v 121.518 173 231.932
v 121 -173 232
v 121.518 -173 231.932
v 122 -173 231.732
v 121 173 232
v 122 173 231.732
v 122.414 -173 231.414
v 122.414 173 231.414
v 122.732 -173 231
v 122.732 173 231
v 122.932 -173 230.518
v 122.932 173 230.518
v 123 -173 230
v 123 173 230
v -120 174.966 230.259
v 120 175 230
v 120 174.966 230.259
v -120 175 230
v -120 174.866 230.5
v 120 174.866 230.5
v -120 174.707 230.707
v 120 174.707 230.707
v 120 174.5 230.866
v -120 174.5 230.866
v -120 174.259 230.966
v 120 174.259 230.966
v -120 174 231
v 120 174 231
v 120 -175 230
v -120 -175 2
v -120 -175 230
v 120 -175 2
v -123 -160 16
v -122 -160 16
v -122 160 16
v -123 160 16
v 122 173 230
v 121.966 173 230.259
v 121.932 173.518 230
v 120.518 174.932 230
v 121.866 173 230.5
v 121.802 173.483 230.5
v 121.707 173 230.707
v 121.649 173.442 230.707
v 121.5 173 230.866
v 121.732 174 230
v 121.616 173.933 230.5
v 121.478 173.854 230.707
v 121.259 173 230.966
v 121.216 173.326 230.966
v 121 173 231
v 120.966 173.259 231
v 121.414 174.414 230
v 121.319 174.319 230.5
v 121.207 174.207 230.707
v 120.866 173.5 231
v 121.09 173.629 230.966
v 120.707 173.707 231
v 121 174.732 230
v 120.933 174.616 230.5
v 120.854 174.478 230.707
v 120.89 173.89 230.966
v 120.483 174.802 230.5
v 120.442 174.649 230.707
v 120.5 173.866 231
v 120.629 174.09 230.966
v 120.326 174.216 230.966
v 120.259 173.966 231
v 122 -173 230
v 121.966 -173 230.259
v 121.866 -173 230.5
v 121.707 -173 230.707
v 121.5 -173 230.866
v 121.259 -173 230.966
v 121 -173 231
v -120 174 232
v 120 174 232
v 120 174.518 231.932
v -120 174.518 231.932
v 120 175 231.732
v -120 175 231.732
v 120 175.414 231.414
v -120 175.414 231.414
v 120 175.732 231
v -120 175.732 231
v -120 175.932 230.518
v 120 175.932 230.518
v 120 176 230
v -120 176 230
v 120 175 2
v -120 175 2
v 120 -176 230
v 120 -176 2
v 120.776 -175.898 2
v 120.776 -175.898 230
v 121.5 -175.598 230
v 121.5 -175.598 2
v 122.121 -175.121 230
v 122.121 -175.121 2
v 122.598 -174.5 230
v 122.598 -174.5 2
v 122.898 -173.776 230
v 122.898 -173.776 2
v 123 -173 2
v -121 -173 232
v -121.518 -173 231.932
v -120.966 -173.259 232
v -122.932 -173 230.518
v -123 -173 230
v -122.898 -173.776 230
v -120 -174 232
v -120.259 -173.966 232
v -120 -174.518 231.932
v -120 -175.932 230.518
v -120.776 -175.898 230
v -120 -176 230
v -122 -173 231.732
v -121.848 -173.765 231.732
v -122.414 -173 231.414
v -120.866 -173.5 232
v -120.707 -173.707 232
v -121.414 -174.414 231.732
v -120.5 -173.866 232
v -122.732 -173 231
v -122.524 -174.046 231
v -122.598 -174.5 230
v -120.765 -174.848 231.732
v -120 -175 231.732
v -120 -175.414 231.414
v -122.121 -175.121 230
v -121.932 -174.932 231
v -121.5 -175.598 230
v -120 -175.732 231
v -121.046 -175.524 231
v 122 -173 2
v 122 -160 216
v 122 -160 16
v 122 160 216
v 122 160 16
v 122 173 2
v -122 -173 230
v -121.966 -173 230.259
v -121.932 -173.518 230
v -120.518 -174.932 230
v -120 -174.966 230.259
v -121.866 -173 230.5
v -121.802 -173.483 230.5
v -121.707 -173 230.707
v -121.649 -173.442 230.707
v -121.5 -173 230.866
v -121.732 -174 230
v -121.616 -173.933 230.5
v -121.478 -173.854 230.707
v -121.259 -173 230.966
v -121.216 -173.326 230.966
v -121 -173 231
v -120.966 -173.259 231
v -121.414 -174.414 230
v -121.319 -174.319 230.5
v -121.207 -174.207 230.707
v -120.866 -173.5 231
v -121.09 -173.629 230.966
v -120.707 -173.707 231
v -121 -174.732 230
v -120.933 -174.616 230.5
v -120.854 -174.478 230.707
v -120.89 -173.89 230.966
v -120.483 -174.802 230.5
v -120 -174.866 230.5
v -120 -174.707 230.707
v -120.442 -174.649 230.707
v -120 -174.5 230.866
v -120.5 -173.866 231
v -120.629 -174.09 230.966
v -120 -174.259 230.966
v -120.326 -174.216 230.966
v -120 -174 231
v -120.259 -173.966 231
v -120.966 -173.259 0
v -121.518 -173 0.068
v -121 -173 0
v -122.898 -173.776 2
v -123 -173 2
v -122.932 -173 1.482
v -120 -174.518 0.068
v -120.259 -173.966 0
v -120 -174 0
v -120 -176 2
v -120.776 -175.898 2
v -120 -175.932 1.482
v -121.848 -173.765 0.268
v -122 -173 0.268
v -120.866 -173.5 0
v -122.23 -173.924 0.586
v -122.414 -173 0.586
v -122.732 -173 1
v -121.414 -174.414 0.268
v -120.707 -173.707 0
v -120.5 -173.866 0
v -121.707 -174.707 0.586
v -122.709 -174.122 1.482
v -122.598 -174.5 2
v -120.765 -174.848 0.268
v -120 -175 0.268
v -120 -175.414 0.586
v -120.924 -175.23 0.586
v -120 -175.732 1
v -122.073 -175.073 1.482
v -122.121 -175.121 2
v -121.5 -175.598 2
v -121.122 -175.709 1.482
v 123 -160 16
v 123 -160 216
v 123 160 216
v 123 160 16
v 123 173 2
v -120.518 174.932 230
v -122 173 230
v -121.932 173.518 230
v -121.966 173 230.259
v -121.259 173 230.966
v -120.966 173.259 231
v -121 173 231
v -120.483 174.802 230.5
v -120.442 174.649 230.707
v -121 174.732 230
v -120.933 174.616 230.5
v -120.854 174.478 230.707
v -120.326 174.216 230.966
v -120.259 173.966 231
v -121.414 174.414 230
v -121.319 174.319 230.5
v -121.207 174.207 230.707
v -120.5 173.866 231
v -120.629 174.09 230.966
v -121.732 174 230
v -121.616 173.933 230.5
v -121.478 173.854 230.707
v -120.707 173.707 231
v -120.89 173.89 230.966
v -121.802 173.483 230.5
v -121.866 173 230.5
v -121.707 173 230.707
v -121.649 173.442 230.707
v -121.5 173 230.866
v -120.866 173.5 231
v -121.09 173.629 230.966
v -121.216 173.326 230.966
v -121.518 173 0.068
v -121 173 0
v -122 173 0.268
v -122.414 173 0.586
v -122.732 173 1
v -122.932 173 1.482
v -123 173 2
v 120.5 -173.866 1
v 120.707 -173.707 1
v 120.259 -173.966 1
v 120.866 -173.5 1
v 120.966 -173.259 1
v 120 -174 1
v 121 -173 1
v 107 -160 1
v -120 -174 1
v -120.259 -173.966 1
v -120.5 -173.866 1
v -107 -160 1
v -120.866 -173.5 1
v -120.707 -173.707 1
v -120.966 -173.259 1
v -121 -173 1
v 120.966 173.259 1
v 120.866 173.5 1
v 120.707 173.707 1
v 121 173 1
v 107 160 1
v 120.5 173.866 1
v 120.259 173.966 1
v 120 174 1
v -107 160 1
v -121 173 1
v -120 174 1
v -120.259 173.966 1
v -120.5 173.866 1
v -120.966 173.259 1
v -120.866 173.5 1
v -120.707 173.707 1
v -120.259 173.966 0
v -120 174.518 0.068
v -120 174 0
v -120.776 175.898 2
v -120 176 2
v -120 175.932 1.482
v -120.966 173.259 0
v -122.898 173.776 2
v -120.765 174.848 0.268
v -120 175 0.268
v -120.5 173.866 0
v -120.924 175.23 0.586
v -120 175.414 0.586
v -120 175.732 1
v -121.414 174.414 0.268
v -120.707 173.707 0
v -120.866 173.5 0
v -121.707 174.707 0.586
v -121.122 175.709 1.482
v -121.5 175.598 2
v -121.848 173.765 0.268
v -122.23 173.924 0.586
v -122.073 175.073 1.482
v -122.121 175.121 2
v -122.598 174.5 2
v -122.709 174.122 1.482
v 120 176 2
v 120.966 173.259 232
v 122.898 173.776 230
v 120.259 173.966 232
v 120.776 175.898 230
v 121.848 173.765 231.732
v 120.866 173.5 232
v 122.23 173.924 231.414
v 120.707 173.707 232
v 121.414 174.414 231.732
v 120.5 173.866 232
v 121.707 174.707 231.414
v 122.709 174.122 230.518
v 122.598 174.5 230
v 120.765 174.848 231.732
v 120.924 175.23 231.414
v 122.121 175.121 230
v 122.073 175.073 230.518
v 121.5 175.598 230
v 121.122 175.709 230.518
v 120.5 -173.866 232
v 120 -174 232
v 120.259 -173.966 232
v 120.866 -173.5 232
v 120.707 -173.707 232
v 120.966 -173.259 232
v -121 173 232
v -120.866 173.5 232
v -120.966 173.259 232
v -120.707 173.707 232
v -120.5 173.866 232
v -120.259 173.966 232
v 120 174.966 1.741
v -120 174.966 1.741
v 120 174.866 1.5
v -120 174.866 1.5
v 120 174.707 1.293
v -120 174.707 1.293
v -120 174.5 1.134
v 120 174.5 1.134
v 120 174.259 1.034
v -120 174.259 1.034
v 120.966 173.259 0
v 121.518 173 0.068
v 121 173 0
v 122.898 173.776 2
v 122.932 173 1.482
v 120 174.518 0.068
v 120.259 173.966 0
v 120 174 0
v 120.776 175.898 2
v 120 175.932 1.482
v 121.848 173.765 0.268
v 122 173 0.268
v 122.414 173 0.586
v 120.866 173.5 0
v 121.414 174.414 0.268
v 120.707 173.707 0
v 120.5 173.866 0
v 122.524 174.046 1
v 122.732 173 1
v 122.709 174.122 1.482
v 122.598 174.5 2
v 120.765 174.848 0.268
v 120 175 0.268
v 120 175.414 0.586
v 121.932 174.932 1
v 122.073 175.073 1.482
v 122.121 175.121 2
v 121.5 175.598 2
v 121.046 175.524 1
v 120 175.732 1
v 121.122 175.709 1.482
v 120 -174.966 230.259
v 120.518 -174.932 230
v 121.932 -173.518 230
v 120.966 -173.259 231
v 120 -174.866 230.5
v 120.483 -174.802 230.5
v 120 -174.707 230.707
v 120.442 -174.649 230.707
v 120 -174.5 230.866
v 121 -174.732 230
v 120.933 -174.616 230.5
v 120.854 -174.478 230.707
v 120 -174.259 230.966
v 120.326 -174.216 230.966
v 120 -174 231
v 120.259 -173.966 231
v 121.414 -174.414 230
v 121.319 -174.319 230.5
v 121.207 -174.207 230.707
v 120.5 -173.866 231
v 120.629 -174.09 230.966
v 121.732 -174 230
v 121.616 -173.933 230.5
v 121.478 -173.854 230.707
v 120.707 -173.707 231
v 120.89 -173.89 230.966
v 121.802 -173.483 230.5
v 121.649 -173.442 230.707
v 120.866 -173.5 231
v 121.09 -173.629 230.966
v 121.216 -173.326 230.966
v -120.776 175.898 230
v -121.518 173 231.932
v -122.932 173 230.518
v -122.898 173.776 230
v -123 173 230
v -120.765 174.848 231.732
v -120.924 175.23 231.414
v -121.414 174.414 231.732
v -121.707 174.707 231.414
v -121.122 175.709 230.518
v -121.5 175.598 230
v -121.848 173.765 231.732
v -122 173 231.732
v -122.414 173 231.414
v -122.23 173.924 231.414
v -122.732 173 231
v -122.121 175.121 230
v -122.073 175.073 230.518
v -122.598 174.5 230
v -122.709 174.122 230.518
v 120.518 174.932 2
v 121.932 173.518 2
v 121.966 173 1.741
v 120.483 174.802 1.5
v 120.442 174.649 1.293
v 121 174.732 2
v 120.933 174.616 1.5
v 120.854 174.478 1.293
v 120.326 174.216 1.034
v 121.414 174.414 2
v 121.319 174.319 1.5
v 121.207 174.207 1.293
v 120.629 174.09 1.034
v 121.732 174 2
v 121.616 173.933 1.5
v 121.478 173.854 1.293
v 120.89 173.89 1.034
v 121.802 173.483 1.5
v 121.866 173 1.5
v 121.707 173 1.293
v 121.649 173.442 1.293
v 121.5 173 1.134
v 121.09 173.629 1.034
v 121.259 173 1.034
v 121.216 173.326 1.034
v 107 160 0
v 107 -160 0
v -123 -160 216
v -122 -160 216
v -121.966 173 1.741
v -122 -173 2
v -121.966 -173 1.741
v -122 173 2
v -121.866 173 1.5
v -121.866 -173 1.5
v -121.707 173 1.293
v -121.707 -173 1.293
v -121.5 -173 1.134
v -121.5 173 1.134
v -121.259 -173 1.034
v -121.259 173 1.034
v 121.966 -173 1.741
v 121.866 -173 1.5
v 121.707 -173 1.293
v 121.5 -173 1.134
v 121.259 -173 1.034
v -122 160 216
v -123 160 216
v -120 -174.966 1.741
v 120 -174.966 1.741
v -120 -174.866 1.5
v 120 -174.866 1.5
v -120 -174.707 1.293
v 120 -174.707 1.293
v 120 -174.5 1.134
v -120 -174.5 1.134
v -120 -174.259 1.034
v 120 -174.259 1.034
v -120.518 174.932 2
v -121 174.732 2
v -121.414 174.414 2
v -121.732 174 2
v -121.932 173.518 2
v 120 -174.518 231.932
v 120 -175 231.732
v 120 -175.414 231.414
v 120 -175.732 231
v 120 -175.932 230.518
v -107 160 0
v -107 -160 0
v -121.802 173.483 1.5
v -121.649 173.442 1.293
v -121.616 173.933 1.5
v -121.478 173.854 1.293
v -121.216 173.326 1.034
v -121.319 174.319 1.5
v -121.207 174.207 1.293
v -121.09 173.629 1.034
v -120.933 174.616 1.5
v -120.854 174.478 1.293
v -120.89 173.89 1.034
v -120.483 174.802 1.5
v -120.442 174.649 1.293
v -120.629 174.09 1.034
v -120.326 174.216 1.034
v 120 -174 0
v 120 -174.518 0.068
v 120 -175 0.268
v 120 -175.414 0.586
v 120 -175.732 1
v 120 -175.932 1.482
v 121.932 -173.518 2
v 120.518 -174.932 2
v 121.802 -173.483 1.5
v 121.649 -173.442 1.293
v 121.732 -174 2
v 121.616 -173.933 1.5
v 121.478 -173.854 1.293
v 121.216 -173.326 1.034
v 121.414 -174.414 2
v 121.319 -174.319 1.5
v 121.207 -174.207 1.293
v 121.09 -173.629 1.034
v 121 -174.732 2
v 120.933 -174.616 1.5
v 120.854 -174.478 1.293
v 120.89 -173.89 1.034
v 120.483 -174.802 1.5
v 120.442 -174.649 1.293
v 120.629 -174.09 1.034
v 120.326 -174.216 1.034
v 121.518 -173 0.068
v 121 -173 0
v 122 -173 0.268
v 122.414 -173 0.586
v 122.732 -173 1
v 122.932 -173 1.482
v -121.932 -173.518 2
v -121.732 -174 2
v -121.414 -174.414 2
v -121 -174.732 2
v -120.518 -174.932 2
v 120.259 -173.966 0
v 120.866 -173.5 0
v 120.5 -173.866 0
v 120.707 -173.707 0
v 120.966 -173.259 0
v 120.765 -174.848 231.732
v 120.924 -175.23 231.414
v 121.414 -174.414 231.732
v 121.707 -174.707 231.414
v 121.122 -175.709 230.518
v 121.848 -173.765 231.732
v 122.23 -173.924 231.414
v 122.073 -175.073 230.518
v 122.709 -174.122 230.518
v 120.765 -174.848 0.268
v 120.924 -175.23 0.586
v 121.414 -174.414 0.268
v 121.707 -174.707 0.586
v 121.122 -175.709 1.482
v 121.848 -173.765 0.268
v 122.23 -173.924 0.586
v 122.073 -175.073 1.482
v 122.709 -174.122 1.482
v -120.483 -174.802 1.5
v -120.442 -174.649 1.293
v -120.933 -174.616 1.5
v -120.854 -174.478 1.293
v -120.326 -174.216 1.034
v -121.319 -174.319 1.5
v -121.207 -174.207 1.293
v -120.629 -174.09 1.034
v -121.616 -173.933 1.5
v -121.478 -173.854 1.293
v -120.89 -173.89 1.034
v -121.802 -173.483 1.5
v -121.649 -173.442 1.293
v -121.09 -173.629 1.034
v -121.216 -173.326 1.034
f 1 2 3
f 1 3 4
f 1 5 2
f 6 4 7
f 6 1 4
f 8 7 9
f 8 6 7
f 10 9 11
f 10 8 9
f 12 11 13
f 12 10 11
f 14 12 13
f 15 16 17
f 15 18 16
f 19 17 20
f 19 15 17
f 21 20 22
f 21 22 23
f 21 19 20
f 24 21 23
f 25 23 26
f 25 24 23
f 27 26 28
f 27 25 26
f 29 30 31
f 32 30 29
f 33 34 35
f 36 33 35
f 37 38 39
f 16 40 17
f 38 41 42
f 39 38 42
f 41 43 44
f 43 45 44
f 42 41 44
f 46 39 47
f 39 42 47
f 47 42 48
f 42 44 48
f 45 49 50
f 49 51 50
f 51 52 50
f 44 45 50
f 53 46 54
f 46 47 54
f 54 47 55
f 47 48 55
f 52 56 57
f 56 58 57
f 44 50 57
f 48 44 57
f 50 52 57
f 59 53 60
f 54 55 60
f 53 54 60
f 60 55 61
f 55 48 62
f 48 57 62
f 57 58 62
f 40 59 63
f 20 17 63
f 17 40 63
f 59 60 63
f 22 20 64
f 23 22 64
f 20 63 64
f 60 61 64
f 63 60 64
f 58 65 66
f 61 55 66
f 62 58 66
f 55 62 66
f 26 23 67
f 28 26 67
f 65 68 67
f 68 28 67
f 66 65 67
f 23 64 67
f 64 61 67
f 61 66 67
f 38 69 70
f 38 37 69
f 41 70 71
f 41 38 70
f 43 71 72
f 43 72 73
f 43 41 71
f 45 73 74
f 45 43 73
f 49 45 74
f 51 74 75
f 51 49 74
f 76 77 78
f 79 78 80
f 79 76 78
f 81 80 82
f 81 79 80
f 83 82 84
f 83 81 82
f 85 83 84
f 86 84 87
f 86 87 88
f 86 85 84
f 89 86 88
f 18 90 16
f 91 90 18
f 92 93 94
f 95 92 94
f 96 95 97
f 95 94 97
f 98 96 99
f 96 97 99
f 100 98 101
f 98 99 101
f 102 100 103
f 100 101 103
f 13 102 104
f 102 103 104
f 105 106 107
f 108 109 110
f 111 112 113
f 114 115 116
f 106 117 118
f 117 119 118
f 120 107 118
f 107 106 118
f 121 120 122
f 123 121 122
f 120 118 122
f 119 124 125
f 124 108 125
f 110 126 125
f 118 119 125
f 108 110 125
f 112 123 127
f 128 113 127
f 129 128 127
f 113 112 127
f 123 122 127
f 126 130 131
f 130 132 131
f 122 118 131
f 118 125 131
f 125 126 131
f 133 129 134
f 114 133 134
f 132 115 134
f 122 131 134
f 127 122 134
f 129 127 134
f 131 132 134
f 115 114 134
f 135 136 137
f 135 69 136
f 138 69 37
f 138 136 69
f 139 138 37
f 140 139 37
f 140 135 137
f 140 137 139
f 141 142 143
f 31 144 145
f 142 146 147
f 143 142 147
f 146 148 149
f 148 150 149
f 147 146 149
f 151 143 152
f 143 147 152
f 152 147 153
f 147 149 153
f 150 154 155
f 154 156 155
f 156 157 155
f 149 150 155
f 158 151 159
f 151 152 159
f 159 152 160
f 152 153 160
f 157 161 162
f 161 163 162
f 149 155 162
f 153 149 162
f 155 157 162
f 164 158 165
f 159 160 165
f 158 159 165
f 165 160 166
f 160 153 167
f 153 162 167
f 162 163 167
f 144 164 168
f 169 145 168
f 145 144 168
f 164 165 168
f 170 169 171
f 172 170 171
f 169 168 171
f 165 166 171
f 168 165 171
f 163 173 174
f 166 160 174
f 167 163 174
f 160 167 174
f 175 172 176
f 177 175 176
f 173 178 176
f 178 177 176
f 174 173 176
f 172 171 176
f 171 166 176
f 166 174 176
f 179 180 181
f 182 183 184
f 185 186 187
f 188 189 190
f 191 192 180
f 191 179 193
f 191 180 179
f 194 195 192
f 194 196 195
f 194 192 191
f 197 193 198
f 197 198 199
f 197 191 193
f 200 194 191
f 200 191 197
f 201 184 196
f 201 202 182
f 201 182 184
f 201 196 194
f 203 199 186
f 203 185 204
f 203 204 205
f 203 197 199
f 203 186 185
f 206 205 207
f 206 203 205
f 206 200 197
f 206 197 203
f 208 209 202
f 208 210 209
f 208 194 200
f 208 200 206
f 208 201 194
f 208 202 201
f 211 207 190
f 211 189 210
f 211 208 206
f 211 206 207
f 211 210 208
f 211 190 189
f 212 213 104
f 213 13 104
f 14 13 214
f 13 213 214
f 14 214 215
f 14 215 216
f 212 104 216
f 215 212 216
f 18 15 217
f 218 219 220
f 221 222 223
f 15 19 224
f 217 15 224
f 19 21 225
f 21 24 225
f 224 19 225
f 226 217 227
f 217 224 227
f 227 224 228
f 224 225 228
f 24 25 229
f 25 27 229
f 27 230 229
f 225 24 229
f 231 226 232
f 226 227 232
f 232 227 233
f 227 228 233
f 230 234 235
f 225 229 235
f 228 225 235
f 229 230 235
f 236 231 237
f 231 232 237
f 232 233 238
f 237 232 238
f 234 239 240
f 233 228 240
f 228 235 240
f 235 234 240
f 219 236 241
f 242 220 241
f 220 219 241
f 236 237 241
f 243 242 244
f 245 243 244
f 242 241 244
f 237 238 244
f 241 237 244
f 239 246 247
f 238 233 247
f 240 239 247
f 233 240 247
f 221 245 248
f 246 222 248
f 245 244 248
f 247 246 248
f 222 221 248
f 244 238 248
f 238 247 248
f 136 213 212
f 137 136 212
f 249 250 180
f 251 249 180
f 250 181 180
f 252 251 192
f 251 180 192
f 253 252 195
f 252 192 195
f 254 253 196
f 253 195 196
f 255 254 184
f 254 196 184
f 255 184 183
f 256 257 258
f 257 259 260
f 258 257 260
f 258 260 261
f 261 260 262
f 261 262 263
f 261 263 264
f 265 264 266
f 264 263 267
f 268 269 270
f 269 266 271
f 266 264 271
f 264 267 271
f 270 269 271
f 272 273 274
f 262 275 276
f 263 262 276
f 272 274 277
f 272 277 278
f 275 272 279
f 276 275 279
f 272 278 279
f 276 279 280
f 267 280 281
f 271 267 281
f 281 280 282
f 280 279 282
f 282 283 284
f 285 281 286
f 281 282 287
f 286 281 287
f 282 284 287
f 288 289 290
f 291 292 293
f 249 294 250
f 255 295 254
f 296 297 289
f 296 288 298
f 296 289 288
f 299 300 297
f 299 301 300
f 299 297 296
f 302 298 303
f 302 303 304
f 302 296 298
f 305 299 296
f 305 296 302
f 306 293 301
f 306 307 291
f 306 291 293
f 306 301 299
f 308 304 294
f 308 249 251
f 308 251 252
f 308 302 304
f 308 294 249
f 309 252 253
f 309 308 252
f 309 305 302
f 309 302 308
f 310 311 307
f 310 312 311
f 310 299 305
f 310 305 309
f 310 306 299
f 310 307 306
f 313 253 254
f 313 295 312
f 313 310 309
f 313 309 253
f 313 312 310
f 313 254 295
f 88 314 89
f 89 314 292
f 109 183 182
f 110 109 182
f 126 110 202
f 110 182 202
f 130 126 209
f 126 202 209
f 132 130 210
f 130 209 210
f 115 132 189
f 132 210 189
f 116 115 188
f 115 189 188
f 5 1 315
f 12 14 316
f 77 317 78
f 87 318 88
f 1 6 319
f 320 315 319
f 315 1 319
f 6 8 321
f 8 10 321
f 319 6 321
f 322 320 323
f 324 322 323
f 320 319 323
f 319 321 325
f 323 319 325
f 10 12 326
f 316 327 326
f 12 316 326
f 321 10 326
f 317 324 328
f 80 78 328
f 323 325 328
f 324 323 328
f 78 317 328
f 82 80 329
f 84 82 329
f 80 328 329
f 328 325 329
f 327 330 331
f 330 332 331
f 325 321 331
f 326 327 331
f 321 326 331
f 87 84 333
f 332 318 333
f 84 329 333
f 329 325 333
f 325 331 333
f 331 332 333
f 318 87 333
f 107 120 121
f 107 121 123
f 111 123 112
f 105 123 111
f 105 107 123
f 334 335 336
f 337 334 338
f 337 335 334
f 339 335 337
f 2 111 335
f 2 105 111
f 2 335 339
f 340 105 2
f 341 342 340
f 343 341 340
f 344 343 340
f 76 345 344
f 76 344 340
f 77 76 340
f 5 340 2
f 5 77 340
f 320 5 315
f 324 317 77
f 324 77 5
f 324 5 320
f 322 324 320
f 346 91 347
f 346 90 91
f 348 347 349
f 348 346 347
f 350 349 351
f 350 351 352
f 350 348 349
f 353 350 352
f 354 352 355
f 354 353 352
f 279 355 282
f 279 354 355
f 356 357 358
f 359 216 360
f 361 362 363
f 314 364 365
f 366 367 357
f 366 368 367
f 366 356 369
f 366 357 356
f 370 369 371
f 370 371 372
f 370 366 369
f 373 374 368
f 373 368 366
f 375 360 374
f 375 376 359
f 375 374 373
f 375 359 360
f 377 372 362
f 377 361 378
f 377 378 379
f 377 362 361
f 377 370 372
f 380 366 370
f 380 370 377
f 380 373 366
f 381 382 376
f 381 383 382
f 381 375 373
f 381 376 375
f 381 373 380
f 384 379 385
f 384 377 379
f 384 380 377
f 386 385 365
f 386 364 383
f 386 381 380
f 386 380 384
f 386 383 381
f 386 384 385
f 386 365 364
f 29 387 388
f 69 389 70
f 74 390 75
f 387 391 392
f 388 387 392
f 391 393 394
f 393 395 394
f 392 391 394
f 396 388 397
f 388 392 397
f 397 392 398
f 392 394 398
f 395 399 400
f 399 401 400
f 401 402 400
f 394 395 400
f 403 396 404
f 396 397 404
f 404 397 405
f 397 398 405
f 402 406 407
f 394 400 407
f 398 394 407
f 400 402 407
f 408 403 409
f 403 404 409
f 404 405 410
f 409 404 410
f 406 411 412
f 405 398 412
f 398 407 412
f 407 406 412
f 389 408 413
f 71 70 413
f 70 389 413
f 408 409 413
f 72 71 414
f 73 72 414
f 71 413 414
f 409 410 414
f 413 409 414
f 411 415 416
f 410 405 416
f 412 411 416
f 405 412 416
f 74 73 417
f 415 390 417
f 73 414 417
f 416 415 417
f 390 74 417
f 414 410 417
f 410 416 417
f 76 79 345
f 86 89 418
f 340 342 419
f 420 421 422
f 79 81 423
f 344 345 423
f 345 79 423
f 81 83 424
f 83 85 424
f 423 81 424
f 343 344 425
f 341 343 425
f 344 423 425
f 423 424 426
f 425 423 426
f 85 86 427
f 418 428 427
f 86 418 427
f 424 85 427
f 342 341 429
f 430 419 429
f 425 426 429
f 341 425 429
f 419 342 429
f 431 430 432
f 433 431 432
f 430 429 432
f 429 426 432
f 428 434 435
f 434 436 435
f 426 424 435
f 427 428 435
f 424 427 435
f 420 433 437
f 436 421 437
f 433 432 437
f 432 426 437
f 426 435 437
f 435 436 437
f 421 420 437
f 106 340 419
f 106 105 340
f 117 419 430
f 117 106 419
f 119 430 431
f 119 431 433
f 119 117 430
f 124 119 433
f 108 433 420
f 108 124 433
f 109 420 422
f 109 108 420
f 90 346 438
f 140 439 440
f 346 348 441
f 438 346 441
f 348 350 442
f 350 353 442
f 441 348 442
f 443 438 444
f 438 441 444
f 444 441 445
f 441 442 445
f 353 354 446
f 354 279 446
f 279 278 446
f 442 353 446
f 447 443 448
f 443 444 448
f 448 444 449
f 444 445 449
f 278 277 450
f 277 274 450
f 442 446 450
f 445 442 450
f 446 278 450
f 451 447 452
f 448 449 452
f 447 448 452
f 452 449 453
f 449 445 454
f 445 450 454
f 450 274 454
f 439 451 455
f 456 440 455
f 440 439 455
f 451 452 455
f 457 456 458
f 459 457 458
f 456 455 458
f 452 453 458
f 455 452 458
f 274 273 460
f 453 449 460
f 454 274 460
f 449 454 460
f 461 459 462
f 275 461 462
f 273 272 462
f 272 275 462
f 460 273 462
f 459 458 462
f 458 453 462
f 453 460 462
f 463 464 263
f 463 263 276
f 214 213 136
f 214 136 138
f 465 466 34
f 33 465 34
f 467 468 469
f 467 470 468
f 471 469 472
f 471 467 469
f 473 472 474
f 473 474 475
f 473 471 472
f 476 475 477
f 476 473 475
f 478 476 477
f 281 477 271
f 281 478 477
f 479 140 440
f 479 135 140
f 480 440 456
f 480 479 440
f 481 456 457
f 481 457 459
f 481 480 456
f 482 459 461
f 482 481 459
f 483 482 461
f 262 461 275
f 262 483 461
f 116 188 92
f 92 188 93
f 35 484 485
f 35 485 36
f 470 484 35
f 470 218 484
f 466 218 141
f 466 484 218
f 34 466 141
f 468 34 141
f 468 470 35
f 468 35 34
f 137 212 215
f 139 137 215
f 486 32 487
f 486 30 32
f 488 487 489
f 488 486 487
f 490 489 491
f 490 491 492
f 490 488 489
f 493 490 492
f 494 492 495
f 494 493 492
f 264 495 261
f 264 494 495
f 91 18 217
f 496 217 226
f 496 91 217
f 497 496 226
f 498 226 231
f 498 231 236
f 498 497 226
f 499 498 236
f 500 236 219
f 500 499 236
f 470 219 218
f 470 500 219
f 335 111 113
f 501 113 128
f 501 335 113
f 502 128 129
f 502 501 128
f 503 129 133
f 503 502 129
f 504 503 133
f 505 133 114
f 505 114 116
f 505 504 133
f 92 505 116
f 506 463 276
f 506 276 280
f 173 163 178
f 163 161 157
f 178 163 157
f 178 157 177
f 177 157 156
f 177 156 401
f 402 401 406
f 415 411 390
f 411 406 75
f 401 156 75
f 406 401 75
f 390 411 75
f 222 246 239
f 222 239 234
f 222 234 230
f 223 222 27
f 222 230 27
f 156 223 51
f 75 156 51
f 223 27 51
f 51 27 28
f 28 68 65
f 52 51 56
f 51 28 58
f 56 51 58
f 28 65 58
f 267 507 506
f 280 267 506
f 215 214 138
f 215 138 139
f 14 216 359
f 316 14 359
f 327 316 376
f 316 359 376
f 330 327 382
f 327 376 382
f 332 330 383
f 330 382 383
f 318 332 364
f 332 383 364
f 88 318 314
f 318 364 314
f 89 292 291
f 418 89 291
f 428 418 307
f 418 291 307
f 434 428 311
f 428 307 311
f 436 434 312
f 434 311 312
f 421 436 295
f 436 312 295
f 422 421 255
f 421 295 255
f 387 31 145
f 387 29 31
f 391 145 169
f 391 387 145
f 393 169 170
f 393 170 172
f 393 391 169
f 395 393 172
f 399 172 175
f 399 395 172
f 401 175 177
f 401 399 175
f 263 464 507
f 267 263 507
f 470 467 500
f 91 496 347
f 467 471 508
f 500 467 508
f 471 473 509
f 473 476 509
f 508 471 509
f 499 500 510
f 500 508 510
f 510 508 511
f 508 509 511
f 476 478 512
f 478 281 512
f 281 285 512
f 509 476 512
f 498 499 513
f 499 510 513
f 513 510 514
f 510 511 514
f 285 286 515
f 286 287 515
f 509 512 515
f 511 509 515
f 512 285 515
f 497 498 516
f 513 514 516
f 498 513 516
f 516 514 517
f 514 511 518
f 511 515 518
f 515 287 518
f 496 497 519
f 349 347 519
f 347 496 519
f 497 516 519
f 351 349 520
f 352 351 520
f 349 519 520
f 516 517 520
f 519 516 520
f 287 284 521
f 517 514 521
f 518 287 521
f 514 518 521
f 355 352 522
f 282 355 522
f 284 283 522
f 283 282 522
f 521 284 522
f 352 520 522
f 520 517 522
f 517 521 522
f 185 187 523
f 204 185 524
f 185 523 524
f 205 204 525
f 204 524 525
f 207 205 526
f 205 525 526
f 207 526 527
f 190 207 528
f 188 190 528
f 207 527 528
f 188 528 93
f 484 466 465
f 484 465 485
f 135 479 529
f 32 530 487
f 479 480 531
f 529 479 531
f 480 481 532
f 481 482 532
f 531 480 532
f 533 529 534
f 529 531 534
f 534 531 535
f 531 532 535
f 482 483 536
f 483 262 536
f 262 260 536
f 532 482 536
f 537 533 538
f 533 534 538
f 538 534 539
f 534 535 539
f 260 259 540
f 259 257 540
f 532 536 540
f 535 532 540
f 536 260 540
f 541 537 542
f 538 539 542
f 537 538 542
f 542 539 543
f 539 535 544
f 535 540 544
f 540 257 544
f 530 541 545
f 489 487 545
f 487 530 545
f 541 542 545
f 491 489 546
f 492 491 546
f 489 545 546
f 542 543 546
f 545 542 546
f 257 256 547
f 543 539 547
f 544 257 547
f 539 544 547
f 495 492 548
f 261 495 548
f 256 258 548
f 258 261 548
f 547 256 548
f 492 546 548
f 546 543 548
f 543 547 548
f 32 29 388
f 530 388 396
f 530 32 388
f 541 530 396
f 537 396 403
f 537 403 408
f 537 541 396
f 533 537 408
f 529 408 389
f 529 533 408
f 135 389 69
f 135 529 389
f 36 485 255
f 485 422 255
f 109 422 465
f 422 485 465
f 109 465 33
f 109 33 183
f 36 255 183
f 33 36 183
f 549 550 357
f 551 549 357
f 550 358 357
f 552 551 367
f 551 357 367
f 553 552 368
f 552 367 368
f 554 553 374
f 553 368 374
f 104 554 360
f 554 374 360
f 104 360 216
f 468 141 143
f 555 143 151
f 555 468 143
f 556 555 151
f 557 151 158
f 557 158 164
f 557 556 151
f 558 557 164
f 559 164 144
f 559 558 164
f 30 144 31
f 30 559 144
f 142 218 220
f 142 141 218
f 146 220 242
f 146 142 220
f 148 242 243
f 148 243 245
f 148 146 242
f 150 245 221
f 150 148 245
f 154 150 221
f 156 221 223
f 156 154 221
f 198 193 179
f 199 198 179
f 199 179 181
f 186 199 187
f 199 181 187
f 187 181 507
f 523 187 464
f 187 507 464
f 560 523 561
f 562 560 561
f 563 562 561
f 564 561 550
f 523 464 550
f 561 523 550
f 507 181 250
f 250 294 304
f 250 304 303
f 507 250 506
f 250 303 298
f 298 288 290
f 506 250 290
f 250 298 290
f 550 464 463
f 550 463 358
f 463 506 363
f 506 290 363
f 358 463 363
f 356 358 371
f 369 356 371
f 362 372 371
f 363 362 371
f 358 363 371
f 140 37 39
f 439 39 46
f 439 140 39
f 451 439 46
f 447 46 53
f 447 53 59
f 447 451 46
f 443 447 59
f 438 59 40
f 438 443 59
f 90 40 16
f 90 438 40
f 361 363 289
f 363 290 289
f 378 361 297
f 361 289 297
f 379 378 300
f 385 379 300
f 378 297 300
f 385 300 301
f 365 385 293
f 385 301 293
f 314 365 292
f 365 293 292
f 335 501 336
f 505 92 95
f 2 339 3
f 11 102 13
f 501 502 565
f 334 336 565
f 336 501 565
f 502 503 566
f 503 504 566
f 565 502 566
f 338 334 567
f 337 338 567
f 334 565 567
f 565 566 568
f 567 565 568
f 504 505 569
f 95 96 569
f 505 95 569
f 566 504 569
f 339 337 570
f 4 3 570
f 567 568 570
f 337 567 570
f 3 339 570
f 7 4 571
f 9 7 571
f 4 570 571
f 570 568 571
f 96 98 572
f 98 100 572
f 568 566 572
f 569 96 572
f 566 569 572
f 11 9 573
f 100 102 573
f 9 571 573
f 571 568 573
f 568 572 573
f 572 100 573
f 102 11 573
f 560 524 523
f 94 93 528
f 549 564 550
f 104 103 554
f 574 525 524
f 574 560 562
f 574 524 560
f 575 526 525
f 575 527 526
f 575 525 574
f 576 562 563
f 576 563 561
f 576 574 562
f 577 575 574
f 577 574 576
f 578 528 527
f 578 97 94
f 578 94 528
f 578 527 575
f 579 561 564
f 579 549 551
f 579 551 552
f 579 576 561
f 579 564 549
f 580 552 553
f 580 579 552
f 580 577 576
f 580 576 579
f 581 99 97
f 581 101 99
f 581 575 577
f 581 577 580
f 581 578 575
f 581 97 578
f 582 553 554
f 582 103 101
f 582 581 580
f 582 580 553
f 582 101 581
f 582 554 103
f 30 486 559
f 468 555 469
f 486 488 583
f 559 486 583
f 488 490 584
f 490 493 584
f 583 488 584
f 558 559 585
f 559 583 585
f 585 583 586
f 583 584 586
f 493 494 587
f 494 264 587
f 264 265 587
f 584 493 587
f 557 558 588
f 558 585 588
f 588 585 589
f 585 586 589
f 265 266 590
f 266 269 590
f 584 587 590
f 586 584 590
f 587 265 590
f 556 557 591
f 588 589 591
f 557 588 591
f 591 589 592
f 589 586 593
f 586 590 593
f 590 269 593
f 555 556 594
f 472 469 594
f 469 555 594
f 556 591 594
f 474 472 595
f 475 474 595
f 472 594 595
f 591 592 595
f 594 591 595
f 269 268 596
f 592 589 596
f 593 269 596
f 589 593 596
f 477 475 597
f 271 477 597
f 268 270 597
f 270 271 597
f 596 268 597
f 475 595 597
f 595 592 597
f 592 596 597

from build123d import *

# Parameters (mm, degrees)
EXTRUDE_1_DEPTH     = 232
SKETCH_2_W          = 200
SKETCH_2_H          = 320
CUT_EXTRUDE_1_DEPTH = 500
EXTRUDE_START       = -1
EXTRUDE_1_2_DEPTH   = 1
SKETCH_4_W          = 214
SKETCH_4_H          = 320
EXTRUDE_2_DEPTH     = 1
FILLET_1_R          = 1
FILLET_2_R          = 2


with BuildPart() as part:
    # Эскиз1 → Extrude 1 (new body)
    with BuildSketch(Plane.XY):
        with BuildLine():
            Line((123, -173), (123, 173))
            ThreePointArc((123, 173), (122.121320344, 175.121320344), (120, 176))
            Line((120, 176), (-120, 176))
            ThreePointArc((-120, 176), (-122.121320344, 175.121320344), (-123, 173))
            Line((-123, 173), (-123, -173))
            ThreePointArc((-123, -173), (-122.121320344, -175.121320344), (-120, -176))
            Line((-120, -176), (120, -176))
            ThreePointArc((120, -176), (122.121320344, -175.121320344), (123, -173))
        make_face()
        with BuildLine():
            Line((122, -173), (122, 173))
            ThreePointArc((122, 173), (121.414213562, 174.414213562), (120, 175))
            Line((120, 175), (-120, 175))
            ThreePointArc((-120, 175), (-121.414213562, 174.414213562), (-122, 173))
            Line((-122, 173), (-122, -173))
            ThreePointArc((-122, -173), (-121.414213562, -174.414213562), (-120, -175))
            Line((-120, -175), (120, -175))
            ThreePointArc((120, -175), (121.414213562, -174.414213562), (122, -173))
        make_face(mode=Mode.SUBTRACT)
    extrude(amount=EXTRUDE_1_DEPTH)

    # Эскиз2 → Вырез-Вытянуть1 (cut)
    with BuildSketch(Plane(origin=(123, 0, 0), x_dir=(0, 0, -1), z_dir=(1, 0, 0))):
        with Locations((-116, 0)):
            Rectangle(SKETCH_2_W, SKETCH_2_H)
    extrude(amount=-CUT_EXTRUDE_1_DEPTH, mode=Mode.SUBTRACT)

    # Эскиз3 → Extrude 1 2 (add)
    with BuildSketch(Plane.XY.offset(232).offset(EXTRUDE_START)):
        with BuildLine():
            Line((-123, 173), (-123, -173))
            ThreePointArc((-123, -173), (-122.121320344, -175.121320344), (-120, -176))
            Line((-120, -176), (120, -176))
            ThreePointArc((120, -176), (122.121320344, -175.121320344), (123, -173))
            Line((123, -173), (123, 173))
            ThreePointArc((123, 173), (122.121320344, 175.121320344), (120, 176))
            Line((120, 176), (-120, 176))
            ThreePointArc((-120, 176), (-122.121320344, 175.121320344), (-123, 173))
        make_face()
    extrude(amount=EXTRUDE_1_2_DEPTH)

    # Эскиз4 → Вытянуть2 (add)
    with BuildSketch(Plane(origin=(0, 0, 0), x_dir=(-1, 0, 0), z_dir=(0, 0, -1))):
        with BuildLine():
            Line((120, 176), (-120, 176))
            ThreePointArc((-120, 176), (-122.121320344, 175.121320344), (-123, 173))
            Line((-123, 173), (-123, -173))
            ThreePointArc((-123, -173), (-122.121320344, -175.121320344), (-120, -176))
            Line((-120, -176), (120, -176))
            ThreePointArc((120, -176), (122.121320344, -175.121320344), (123, -173))
            Line((123, -173), (123, 173))
            ThreePointArc((123, 173), (122.121320344, 175.121320344), (120, 176))
        make_face()
        Rectangle(SKETCH_4_W, SKETCH_4_H, mode=Mode.SUBTRACT)
    extrude(amount=-EXTRUDE_2_DEPTH)

    # Скругление1
    fillet_1_edges = [part.edges().sort_by_distance(p)[0] for p in [
        (-122, 0, 1),
        (-121.414213562, 174.414213562, 1),
        (0, 175, 1),
        (121.414213562, 174.414213562, 1),
        (122, 0, 1),
        (121.414213562, -174.414213562, 1),
        (0, -175, 1),
        (-121.414213562, -174.414213562, 1),
        (0, 175, 231),
        (-121.414213562, 174.414213562, 231),
        (-122, 0, 231),
        (-121.414213562, -174.414213562, 231),
        (0, -175, 231),
        (121.414213562, -174.414213562, 231),
        (122, 0, 231),
        (121.414213562, 174.414213562, 231),
    ]]
    fillet(fillet_1_edges, radius=FILLET_1_R)

    # Скругление2
    fillet_2_edges = [part.edges().sort_by_distance(p)[0] for p in [
        (-122.121320344, -175.121320344, 232),
        (0, -176, 232),
        (122.121320344, -175.121320344, 232),
        (123, 0, 232),
        (122.121320344, 175.121320344, 232),
        (0, 176, 232),
        (-122.121320344, 175.121320344, 232),
        (0, 176, 0),
        (122.121320344, 175.121320344, 0),
        (123, 0, 0),
        (122.121320344, -175.121320344, 0),
        (0, -176, 0),
        (-122.121320344, -175.121320344, 0),
        (-123, 0, 0),
        (-122.121320344, 175.121320344, 0),
        (-123, 0, 232),
    ]]
    fillet(fillet_2_edges, radius=FILLET_2_R)


solid = part.part
